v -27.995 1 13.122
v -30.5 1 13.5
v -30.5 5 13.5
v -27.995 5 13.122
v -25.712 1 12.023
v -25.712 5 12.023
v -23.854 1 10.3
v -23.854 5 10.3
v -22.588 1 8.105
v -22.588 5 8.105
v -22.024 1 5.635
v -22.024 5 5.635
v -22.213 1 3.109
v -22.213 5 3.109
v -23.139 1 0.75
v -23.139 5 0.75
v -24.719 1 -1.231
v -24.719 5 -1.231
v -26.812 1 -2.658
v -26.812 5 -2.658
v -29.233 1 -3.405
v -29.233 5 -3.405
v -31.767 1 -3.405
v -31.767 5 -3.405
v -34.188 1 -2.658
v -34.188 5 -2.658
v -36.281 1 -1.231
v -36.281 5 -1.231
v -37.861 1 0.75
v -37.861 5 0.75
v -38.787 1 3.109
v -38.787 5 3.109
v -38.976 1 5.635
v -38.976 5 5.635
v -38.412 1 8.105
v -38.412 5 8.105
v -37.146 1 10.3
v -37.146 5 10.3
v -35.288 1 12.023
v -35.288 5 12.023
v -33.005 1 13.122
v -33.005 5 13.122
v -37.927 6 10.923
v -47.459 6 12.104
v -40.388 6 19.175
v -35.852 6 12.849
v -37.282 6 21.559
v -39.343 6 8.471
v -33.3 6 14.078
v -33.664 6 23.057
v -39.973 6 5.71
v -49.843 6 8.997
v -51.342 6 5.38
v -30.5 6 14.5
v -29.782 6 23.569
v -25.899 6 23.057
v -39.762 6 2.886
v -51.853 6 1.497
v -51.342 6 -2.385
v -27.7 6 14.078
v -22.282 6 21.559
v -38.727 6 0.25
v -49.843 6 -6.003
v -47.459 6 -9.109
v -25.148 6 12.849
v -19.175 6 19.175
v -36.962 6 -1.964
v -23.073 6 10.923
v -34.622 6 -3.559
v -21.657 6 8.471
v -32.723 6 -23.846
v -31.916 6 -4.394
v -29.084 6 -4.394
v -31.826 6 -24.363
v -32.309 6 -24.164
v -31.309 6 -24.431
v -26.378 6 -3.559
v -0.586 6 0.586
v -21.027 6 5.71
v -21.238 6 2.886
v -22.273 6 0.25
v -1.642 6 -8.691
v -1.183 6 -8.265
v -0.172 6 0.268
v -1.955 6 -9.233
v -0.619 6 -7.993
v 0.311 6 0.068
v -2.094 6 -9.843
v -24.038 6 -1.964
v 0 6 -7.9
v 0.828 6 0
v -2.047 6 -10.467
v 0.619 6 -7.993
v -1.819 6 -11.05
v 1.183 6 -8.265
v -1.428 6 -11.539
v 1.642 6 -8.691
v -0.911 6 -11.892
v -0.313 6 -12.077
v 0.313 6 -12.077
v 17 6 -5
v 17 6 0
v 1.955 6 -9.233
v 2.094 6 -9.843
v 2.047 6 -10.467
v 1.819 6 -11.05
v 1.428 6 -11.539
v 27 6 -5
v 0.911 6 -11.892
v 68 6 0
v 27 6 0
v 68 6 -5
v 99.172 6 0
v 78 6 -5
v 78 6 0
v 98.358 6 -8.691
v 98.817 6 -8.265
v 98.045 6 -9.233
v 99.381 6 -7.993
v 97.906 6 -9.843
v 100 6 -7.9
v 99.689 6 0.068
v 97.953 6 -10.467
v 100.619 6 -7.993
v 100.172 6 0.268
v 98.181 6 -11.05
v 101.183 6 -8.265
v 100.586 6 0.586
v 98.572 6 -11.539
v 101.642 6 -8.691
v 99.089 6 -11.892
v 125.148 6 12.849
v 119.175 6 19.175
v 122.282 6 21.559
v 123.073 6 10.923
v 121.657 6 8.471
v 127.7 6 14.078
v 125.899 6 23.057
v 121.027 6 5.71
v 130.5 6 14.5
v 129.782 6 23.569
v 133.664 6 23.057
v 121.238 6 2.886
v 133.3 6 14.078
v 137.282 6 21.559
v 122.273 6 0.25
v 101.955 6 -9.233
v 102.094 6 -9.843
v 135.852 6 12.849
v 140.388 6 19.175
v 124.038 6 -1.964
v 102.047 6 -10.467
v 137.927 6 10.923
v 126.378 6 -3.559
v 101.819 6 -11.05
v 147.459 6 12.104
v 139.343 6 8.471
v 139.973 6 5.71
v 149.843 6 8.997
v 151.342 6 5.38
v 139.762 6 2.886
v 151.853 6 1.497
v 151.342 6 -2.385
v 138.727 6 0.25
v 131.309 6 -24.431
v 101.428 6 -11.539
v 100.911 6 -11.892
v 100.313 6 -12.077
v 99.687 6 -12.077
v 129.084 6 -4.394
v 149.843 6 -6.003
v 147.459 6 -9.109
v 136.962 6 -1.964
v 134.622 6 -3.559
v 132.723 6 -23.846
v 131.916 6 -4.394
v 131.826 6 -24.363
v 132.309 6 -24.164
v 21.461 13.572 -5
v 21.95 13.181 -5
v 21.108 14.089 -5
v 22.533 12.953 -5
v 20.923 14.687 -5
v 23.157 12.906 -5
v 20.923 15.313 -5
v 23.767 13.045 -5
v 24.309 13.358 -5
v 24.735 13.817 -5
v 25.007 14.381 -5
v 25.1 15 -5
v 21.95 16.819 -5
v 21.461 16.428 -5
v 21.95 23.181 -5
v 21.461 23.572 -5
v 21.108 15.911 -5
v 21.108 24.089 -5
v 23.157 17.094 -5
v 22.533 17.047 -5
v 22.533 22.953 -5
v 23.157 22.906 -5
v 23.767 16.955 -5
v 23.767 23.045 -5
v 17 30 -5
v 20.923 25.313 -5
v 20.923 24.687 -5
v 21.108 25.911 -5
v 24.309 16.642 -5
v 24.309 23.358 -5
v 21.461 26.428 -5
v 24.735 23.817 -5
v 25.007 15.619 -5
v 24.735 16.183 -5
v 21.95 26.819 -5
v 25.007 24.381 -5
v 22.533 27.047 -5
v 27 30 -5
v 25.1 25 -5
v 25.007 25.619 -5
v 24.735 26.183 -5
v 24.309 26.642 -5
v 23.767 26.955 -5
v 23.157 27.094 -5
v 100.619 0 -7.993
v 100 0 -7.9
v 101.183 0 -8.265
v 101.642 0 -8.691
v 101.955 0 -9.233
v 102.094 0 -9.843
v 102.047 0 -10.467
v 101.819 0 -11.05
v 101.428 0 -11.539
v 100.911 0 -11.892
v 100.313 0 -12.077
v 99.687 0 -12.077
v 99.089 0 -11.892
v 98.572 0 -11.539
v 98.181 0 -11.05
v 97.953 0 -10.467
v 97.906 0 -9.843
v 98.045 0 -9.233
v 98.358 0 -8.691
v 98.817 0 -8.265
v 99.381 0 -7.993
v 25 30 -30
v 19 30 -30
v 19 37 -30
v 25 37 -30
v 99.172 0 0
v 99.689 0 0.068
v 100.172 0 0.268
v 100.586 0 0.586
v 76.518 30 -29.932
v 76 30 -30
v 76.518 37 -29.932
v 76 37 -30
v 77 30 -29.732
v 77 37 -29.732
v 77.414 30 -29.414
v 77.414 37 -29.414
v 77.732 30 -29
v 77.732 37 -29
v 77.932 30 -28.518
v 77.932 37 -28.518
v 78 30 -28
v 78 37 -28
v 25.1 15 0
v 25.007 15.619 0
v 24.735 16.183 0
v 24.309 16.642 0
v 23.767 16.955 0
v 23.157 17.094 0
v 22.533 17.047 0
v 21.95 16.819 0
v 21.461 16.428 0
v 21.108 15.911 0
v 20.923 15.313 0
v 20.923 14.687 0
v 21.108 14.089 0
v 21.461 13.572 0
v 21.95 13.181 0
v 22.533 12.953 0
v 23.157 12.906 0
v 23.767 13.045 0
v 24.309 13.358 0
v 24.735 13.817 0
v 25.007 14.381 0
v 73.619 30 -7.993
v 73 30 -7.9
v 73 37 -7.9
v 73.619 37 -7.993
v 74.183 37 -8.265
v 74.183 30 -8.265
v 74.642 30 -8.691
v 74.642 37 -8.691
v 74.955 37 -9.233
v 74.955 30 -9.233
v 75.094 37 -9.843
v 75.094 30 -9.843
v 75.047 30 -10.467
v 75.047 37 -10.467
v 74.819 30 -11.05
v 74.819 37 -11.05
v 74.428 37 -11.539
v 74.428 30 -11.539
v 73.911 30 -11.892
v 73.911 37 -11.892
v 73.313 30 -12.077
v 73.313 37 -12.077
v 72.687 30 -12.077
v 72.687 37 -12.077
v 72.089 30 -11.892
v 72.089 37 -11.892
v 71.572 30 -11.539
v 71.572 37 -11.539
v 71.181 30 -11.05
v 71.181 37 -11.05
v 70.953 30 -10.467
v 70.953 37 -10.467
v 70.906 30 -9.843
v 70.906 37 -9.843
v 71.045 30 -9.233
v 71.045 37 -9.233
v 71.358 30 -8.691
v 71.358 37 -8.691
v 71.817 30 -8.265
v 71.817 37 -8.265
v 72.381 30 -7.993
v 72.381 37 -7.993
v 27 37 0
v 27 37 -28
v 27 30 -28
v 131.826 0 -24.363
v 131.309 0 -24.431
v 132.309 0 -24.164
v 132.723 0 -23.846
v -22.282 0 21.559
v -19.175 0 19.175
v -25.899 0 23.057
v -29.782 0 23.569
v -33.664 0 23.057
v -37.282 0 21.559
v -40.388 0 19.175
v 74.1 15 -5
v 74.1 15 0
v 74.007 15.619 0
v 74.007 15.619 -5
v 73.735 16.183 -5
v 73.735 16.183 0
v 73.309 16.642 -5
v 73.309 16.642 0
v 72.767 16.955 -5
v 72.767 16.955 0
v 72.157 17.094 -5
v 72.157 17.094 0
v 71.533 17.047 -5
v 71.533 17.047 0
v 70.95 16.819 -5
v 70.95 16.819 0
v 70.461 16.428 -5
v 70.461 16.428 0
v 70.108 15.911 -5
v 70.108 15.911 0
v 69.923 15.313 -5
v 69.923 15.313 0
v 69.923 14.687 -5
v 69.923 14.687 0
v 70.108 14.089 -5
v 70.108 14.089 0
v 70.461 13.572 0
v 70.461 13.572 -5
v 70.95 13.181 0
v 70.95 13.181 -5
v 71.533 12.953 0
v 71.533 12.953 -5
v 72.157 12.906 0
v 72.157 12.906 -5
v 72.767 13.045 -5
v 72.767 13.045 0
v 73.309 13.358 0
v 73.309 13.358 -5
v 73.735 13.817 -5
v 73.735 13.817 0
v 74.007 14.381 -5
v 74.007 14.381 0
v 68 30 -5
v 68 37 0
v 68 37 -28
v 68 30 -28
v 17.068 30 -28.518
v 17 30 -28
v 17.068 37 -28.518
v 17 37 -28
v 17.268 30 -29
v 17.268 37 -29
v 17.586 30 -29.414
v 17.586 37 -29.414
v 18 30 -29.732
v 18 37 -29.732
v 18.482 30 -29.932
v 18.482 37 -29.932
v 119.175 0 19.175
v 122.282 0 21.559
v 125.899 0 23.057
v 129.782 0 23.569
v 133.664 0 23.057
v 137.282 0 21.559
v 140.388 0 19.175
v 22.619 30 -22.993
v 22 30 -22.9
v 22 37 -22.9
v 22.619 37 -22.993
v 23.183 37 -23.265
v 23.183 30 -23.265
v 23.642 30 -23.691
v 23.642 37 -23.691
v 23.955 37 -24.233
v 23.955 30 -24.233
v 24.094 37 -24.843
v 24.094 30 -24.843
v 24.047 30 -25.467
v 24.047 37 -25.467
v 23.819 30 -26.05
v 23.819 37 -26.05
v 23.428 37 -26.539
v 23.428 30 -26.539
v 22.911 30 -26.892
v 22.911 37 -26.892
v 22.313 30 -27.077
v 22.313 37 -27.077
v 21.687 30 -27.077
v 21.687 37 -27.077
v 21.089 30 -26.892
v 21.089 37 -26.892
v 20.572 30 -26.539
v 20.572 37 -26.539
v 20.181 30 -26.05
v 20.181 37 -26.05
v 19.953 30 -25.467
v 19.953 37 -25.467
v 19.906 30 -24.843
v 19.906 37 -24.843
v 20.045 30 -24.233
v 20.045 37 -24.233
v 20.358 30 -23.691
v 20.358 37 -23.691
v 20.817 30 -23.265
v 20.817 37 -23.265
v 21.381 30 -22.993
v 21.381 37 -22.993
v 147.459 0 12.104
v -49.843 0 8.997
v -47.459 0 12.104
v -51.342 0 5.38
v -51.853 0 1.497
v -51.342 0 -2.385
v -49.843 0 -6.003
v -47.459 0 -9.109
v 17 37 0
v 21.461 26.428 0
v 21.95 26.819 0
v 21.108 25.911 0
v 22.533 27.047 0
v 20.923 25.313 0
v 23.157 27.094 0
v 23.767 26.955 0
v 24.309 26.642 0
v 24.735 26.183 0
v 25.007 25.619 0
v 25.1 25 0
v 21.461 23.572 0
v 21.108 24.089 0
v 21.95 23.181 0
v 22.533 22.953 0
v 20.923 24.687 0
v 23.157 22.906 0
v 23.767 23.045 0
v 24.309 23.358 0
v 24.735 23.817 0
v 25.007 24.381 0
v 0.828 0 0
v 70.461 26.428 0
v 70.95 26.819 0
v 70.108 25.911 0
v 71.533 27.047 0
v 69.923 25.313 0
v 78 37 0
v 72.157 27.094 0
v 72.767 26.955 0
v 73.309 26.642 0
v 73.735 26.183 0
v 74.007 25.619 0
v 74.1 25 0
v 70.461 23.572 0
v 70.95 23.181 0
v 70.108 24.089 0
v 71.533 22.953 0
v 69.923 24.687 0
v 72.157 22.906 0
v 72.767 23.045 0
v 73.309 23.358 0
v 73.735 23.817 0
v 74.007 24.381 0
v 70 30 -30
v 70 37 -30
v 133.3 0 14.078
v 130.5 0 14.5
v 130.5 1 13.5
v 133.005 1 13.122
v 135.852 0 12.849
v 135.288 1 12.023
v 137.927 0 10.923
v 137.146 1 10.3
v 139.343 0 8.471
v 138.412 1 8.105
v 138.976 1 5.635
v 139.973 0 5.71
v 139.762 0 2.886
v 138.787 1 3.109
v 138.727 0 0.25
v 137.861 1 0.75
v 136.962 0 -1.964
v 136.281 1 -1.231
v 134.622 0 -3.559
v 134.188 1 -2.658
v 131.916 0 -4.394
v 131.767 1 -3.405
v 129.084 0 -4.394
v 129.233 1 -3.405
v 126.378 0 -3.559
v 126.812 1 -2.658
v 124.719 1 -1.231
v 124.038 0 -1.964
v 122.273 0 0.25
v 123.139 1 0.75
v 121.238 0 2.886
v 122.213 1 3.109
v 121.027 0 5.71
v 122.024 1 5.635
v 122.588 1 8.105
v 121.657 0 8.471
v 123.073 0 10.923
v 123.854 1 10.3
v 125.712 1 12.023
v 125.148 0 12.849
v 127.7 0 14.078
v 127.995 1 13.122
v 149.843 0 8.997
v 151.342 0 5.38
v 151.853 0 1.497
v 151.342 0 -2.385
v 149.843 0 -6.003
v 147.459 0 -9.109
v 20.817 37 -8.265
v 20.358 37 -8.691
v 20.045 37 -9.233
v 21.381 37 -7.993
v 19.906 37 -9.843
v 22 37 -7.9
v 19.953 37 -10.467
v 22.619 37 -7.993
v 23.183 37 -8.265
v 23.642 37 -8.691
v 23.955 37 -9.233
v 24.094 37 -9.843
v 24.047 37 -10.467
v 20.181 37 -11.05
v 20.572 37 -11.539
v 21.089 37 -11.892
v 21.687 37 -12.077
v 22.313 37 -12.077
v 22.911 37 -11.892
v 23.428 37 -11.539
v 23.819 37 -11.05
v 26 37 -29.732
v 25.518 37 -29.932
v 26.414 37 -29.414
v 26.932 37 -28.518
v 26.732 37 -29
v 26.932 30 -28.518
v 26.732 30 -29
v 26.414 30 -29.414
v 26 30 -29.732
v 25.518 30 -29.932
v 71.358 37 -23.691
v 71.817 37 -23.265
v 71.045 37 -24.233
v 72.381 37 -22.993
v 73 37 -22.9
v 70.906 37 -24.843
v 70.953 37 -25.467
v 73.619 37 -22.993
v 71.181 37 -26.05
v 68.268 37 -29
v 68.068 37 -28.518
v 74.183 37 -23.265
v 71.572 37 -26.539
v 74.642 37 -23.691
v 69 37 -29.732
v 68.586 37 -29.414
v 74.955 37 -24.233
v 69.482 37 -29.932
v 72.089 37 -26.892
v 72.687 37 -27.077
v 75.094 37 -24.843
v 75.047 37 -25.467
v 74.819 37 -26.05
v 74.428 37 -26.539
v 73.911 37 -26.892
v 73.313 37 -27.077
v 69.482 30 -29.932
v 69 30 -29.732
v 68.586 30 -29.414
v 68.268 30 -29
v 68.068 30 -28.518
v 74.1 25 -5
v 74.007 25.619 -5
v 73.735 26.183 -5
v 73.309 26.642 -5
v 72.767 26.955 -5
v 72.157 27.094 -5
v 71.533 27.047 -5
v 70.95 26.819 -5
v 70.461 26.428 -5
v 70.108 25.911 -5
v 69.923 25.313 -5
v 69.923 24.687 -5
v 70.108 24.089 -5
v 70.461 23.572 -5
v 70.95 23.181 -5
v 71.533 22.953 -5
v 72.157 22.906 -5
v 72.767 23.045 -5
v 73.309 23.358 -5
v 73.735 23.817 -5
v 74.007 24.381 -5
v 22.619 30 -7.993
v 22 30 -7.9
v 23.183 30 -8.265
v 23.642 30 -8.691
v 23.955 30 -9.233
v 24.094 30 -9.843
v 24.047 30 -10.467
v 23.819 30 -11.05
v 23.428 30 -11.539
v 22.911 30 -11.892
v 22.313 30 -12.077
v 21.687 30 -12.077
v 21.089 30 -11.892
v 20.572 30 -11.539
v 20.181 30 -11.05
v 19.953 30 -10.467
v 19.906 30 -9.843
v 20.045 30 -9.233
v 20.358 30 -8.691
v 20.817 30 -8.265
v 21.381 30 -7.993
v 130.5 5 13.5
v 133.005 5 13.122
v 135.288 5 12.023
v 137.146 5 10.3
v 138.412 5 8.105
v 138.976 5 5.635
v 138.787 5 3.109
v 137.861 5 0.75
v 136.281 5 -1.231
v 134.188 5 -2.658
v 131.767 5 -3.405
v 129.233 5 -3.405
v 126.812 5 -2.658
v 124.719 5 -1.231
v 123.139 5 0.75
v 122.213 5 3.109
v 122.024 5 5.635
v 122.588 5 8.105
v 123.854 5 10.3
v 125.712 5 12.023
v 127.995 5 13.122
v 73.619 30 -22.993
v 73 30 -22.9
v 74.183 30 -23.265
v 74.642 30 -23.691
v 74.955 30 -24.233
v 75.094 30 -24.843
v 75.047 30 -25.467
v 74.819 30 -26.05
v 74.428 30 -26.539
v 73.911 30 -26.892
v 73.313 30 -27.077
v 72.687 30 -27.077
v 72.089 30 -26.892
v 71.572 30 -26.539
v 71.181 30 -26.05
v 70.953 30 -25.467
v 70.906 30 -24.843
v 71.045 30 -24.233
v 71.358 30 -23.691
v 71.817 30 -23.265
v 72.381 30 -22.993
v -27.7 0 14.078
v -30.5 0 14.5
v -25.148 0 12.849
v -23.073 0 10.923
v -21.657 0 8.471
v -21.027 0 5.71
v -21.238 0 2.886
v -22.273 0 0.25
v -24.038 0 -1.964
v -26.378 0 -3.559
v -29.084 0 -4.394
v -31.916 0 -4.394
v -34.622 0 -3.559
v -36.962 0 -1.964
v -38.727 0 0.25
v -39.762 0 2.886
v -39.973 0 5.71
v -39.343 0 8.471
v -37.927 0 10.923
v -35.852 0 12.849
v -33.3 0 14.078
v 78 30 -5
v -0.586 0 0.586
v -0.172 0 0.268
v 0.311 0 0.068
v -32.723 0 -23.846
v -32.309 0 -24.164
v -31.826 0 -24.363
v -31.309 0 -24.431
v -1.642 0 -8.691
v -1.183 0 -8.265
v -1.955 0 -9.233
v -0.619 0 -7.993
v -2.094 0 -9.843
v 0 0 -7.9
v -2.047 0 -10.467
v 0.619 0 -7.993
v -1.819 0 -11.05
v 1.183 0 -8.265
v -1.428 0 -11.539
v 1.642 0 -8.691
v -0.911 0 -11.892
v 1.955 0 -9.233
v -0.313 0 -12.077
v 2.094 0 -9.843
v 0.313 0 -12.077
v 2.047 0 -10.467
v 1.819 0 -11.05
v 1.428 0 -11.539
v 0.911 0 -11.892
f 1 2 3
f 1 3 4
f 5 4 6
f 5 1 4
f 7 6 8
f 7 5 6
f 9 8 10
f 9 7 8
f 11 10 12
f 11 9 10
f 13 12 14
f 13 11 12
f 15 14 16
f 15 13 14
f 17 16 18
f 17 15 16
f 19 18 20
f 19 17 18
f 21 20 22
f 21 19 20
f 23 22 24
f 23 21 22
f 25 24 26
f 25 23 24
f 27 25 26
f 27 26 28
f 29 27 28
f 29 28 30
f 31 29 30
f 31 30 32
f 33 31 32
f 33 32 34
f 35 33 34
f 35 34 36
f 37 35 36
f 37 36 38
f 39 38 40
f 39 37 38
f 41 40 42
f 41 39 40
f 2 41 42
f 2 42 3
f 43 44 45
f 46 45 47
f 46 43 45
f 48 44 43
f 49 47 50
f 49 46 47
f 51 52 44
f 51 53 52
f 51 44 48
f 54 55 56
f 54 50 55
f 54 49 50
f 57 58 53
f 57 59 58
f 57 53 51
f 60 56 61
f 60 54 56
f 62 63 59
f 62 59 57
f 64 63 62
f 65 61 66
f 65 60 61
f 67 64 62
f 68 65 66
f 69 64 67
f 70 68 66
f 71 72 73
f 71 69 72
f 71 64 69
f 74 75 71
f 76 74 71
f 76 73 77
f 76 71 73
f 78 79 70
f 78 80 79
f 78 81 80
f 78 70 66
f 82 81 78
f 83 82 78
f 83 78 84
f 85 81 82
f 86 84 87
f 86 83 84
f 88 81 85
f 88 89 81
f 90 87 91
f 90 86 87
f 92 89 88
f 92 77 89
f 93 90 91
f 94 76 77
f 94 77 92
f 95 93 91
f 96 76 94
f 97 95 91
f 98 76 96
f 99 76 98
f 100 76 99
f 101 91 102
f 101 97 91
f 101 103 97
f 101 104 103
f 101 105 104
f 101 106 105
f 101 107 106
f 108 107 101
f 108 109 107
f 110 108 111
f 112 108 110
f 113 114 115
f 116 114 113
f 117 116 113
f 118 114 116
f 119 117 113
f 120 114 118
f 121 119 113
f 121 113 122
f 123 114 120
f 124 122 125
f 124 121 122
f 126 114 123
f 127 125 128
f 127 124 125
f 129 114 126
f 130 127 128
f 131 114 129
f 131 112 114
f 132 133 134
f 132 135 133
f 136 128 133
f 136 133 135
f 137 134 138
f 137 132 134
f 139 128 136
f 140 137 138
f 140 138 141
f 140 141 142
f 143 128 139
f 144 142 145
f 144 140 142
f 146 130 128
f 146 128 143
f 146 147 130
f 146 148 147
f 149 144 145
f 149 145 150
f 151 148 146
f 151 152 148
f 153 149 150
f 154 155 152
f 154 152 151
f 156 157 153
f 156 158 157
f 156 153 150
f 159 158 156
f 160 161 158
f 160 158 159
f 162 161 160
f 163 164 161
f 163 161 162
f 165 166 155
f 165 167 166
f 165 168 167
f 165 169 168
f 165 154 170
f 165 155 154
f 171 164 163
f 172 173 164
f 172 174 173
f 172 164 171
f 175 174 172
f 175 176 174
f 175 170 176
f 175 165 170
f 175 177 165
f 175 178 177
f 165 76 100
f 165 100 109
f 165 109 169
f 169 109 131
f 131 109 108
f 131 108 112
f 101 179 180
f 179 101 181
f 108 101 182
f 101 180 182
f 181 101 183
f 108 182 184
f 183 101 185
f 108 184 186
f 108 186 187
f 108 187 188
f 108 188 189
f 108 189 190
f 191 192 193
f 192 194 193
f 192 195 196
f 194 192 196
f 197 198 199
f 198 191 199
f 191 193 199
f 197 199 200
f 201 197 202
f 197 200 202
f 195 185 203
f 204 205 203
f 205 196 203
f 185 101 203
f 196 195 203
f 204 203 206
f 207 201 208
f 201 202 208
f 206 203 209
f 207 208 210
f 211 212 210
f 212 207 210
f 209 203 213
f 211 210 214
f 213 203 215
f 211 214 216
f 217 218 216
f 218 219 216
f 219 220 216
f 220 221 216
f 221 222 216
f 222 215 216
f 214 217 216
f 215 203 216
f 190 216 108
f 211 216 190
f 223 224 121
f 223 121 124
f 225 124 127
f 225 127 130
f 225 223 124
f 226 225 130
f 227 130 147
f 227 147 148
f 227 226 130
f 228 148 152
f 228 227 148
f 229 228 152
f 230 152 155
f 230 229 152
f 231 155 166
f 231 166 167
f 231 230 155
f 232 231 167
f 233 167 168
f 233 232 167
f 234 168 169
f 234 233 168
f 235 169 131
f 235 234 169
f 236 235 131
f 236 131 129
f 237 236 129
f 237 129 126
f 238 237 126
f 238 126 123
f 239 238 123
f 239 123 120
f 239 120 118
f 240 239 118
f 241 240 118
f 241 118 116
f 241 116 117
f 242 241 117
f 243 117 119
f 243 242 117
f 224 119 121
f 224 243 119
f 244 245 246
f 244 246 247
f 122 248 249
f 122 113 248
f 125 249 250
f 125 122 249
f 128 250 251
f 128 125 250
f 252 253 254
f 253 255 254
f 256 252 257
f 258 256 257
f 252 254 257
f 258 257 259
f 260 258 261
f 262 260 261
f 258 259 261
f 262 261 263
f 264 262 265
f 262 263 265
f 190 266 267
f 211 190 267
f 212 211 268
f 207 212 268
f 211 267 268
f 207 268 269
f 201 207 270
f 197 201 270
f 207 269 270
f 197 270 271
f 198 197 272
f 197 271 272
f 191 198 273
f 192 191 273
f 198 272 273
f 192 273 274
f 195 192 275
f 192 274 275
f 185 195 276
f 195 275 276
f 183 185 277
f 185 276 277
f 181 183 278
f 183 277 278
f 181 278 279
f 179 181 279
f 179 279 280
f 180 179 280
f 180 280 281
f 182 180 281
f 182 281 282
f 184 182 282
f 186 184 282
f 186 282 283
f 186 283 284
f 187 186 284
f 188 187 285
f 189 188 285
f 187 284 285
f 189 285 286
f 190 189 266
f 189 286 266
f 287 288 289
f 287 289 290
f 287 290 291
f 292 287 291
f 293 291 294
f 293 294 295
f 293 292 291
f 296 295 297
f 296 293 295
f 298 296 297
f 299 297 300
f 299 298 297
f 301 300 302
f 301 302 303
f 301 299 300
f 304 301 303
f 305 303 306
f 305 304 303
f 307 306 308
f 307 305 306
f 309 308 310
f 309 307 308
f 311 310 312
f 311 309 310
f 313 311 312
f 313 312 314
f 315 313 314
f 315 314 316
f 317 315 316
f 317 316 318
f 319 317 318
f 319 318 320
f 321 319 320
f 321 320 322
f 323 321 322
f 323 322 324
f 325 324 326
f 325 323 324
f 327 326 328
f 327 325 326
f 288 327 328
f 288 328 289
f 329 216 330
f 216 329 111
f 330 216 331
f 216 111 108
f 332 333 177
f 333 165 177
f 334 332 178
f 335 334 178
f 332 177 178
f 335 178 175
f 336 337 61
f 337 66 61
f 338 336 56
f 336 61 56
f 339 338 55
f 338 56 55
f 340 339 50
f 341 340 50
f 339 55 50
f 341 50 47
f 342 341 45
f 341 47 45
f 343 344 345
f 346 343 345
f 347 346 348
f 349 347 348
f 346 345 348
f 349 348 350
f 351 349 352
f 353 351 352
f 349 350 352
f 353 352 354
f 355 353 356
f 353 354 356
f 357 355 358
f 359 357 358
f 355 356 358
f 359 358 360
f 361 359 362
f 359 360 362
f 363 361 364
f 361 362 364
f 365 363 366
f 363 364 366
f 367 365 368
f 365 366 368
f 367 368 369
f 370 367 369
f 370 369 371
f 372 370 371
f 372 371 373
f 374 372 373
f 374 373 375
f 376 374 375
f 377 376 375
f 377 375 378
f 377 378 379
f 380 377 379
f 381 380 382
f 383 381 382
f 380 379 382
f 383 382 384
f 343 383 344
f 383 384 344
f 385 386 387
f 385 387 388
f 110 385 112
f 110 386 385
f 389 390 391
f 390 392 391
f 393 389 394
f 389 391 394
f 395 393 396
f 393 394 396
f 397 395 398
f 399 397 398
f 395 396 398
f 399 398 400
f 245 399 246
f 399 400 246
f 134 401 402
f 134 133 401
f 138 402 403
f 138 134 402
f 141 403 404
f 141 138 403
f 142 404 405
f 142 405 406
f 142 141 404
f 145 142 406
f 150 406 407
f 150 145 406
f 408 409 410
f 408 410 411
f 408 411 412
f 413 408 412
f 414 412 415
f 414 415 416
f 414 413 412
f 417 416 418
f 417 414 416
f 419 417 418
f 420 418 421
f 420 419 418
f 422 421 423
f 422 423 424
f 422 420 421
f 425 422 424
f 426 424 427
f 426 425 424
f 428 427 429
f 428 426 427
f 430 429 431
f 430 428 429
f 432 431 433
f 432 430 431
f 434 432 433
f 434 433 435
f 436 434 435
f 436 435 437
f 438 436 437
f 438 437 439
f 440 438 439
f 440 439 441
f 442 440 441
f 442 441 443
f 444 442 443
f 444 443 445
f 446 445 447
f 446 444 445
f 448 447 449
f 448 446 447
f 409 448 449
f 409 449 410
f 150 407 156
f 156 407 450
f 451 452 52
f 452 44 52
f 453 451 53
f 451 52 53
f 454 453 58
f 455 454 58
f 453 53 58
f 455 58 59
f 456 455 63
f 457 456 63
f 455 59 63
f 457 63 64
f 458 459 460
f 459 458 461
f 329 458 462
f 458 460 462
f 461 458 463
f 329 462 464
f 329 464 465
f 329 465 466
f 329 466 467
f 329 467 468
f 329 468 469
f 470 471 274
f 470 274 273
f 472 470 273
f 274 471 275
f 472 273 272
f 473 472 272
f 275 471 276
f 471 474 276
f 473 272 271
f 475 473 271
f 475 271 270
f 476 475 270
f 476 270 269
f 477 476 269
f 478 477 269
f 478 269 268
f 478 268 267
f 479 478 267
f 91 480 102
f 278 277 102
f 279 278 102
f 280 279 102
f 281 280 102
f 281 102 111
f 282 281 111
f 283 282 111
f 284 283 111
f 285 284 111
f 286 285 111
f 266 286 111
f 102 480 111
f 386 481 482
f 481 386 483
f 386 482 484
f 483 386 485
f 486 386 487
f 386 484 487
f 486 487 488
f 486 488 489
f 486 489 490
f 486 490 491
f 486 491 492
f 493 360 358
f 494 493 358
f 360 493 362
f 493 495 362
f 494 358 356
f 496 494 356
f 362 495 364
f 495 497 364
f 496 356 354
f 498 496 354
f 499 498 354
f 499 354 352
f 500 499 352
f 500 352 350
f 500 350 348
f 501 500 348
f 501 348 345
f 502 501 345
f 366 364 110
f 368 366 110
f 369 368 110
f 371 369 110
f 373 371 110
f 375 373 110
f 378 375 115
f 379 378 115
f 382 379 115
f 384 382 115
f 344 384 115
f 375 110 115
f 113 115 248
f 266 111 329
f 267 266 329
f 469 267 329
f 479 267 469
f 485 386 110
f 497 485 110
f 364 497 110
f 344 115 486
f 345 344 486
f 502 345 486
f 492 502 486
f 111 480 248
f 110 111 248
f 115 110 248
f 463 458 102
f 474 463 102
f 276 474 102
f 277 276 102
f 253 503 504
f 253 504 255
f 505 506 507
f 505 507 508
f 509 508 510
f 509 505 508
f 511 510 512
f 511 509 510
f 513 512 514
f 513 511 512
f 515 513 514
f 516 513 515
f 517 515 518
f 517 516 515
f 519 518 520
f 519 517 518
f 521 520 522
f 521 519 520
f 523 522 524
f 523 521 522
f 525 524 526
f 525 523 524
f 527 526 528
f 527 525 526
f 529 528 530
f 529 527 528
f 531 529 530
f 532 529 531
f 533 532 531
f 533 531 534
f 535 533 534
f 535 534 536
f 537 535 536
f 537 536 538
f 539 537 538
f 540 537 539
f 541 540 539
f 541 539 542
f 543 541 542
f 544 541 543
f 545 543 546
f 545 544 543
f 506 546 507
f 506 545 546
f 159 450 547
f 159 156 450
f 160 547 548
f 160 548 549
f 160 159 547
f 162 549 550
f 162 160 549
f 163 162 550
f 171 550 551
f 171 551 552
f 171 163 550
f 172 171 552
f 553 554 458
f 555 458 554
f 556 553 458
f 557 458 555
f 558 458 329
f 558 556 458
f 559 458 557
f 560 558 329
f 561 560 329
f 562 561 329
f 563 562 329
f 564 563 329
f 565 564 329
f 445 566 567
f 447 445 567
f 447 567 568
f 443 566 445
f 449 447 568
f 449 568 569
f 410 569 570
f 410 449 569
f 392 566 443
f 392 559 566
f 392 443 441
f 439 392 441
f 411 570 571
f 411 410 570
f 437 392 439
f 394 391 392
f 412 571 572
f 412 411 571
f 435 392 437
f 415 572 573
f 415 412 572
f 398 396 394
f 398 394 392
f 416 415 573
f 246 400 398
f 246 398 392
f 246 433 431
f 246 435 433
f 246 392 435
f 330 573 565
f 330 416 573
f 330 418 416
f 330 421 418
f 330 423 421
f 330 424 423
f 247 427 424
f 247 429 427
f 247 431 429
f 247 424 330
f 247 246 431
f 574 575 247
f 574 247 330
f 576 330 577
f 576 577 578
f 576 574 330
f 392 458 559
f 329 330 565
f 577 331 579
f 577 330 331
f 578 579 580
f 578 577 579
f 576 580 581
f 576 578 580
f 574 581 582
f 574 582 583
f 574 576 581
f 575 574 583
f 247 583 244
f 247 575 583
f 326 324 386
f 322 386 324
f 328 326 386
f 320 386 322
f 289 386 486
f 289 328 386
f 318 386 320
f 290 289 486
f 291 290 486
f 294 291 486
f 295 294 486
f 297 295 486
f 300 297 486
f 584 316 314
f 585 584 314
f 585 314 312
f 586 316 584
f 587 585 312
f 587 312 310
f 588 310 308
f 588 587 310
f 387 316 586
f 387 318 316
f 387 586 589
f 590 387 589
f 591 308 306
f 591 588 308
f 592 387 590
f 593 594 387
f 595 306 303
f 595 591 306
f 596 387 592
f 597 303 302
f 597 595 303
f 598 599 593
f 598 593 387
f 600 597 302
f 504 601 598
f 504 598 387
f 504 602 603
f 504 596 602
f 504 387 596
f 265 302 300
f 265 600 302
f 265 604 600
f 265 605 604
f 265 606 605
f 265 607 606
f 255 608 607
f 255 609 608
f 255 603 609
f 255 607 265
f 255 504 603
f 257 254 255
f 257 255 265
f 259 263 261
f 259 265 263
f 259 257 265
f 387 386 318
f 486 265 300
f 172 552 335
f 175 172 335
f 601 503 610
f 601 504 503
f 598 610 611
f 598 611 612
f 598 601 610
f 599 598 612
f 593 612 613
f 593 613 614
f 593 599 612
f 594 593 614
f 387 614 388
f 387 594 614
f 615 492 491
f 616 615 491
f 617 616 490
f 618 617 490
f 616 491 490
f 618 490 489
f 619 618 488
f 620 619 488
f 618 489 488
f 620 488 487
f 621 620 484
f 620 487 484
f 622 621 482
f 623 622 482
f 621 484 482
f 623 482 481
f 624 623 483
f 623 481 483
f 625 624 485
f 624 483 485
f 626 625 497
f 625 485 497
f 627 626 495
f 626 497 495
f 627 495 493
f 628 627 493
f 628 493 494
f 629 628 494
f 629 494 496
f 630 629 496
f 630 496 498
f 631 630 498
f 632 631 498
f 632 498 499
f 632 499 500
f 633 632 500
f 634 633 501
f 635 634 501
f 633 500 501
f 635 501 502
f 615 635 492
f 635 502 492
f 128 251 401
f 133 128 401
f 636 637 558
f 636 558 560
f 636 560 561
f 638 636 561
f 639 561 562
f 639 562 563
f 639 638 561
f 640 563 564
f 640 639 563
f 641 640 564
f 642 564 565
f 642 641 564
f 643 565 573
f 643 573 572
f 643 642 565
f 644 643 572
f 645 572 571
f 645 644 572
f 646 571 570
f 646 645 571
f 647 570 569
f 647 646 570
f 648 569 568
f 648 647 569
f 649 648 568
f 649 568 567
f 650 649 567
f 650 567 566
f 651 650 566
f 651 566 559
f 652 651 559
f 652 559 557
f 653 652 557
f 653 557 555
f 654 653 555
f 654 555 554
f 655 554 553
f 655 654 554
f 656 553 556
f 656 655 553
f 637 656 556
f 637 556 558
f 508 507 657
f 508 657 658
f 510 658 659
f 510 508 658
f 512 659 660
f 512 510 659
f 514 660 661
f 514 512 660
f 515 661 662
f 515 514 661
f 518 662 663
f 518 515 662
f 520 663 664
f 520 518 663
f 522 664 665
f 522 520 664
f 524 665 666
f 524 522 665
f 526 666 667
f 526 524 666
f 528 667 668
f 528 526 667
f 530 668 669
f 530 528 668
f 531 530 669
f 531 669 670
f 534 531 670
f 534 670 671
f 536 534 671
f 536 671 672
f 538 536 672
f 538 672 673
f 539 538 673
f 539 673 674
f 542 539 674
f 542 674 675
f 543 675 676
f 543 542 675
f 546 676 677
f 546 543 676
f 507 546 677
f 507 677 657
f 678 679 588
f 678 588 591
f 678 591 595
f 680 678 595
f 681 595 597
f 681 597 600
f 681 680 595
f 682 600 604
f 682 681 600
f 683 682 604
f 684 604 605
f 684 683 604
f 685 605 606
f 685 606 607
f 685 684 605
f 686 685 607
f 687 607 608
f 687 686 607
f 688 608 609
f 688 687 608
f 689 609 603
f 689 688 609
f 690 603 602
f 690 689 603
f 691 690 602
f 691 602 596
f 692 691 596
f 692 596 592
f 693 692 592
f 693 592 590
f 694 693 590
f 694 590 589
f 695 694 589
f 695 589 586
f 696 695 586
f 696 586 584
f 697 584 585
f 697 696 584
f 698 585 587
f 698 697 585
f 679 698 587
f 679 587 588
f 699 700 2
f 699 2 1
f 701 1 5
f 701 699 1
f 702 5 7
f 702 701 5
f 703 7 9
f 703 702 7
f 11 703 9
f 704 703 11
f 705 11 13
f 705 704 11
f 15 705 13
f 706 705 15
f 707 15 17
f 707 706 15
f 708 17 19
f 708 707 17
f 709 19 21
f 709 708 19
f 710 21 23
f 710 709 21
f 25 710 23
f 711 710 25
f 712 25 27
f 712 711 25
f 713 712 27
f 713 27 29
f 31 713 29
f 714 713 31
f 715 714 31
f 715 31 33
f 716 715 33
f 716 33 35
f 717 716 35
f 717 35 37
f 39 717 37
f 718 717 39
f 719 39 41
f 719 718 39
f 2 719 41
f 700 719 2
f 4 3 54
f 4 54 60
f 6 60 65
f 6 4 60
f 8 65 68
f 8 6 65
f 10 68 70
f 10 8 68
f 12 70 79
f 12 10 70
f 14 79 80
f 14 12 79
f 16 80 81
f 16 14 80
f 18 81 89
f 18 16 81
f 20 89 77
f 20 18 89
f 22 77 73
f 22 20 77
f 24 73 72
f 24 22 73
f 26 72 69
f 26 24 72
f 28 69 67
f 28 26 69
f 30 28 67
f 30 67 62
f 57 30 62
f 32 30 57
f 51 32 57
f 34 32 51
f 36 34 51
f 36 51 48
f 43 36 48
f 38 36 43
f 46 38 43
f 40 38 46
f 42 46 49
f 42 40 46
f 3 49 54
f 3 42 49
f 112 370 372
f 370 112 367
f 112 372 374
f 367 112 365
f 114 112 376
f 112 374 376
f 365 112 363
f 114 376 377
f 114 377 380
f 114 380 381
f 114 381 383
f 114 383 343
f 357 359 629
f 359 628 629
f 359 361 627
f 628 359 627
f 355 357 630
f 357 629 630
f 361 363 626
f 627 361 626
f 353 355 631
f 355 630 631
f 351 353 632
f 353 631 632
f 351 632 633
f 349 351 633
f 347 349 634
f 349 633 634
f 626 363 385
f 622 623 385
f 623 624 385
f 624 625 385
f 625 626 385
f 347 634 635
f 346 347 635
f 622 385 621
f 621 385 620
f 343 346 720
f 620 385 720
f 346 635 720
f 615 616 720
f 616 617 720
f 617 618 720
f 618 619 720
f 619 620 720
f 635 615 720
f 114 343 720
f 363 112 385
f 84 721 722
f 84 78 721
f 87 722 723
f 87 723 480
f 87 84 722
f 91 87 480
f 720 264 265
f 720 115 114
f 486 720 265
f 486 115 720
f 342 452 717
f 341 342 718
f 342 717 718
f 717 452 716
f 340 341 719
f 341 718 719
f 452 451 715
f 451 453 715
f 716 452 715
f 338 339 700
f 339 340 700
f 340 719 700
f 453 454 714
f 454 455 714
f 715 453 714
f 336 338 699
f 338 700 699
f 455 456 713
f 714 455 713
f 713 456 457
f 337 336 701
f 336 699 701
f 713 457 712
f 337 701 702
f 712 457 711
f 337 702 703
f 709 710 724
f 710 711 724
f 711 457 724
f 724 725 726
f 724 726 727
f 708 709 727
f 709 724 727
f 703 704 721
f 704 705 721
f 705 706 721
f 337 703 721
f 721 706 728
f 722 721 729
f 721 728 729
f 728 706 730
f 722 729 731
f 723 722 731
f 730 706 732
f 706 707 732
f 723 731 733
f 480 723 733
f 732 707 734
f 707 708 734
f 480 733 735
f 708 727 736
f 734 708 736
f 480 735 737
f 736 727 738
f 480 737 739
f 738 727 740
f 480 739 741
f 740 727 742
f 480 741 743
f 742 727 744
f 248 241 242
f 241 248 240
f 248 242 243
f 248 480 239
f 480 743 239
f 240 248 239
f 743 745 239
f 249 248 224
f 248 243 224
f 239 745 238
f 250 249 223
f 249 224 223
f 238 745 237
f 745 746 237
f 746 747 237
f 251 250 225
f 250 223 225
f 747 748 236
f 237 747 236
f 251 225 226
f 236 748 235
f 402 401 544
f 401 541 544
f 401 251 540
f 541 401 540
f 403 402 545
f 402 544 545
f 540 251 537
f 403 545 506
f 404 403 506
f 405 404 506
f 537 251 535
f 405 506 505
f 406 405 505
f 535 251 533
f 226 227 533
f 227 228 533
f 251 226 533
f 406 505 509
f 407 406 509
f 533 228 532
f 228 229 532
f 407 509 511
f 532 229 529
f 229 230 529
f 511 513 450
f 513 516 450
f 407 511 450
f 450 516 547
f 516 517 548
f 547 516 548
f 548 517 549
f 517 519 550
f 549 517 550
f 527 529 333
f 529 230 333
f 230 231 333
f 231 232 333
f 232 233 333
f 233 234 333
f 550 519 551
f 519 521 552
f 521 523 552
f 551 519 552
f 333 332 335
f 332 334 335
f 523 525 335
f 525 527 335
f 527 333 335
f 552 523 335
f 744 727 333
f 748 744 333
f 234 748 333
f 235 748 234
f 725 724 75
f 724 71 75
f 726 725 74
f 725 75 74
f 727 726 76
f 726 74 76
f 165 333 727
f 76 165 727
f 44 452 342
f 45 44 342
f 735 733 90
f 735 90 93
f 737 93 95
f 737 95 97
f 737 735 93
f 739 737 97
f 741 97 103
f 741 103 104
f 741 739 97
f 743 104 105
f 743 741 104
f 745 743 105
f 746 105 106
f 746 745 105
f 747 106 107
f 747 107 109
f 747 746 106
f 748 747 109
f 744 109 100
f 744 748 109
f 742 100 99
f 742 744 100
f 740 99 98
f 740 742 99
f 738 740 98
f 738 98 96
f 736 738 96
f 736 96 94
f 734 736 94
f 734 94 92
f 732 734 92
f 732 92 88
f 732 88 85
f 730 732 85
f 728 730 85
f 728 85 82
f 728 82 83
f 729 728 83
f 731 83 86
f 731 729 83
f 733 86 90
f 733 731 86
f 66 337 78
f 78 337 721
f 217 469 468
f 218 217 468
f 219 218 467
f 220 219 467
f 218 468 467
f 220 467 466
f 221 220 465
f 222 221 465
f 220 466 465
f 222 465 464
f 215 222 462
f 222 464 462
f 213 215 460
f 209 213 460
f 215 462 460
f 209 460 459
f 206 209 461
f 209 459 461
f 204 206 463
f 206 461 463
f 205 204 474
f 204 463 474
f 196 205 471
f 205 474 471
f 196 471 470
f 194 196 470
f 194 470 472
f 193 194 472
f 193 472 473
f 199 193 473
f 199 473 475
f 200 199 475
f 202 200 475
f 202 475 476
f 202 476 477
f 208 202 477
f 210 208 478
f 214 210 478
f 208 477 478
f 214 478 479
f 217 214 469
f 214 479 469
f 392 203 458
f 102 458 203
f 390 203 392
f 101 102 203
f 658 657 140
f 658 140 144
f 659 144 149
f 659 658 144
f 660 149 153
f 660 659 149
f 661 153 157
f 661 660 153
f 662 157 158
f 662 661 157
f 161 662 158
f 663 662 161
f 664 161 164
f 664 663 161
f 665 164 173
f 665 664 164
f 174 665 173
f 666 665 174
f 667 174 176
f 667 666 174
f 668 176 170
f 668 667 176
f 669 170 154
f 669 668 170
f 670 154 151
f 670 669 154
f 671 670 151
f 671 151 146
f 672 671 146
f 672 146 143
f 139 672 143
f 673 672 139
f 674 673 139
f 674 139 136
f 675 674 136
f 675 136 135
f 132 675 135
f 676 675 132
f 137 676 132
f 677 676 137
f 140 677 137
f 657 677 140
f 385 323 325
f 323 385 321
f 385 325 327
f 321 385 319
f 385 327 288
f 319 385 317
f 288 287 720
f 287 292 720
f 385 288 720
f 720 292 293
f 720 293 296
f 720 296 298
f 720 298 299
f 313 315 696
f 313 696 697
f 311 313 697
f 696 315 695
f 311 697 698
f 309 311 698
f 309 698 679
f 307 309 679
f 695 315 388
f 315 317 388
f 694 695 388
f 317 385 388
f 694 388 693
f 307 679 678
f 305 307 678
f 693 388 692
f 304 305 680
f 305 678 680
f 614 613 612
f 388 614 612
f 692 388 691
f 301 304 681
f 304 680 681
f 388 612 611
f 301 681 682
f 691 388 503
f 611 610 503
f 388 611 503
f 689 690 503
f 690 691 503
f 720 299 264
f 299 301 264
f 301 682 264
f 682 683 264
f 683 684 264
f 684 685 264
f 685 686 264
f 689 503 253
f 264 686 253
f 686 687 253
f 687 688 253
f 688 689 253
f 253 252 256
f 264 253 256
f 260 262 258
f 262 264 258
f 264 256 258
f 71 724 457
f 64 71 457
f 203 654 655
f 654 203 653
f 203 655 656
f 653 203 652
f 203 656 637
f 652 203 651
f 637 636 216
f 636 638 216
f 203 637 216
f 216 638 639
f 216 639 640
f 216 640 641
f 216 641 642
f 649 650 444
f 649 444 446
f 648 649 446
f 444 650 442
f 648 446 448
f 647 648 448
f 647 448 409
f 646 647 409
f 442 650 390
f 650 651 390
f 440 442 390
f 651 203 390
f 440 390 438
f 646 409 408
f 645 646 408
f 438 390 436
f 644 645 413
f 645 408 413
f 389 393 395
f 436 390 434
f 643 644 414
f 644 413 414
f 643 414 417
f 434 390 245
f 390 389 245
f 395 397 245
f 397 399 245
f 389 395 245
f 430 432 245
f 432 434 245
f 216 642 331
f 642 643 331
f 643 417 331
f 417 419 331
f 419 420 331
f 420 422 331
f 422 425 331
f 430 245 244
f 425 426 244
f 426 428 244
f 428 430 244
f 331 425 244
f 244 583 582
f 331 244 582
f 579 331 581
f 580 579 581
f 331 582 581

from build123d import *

# Parameters (mm, degrees)
SKETCH_1_R      = 8.5
SKETCH_1_R_2    = 2.1
EXTRUDE_1_DEPTH = 6
FILLET_1_R      = 15
FILLET_2_R      = 2
SKETCH_2_R      = 2.1
EXTRUDE_2_DEPTH = 5
SKETCH_3_W      = 10
SKETCH_3_H      = 30
SKETCH_3_R      = 2.1
EXTRUDE_3_DEPTH = 7
FILLET_4_R      = 2
FILLET_5_R      = 2
CHAMFER_1_SIZE  = 1


with BuildPart() as part:
    # 草图1 → 凸台-拉伸1 (new body)
    with BuildSketch(Plane(origin=(0, 0, 0), x_dir=(1, 0, 0), z_dir=(0, 1, 0))):
        Polygon((0, 0), (100, 0), (129.781745931, -29.781745931), (158.066017178, -1.497474683), (132.13708499, 24.431457505), (70, 24.431457505), (30, 24.431457505), (-32.13708499, 24.431457505), (-58.066017178, -1.497474683), (-29.781745931, -29.781745931), align=None)
        with Locations(Location((-30.5, -5, 0), (0, 0, 270))):
            Circle(SKETCH_1_R, mode=Mode.SUBTRACT)
        with Locations(Location((130.5, -5, 0), (0, 0, 270))):
            Circle(SKETCH_1_R, mode=Mode.SUBTRACT)
        with Locations(Location((0, 10, 0), (0, 0, 270))):
            Circle(SKETCH_1_R_2, mode=Mode.SUBTRACT)
        with Locations(Location((100, 10, 0), (0, 0, 270))):
            Circle(SKETCH_1_R_2, mode=Mode.SUBTRACT)
    extrude(amount=EXTRUDE_1_DEPTH)

    # 圆角1
    fillet_1_edges = [part.edges().sort_by_distance(p)[0] for p in [
        (-29.781745931, 3, 29.781745931),
        (-58.066017178, 3, 1.497474683),
        (158.066017178, 3, 1.497474683),
        (129.781745931, 3, 29.781745931),
    ]]
    fillet(fillet_1_edges, radius=FILLET_1_R)

    # 圆角2
    fillet_2_edges = [part.edges().sort_by_distance(p)[0] for p in [
        (100, 3, 0),
        (0, 3, 0),
    ]]
    fillet(fillet_2_edges, radius=FILLET_2_R)

    # 草图2 → 凸台-拉伸2 (add)
    # profile 1 of 4: a face of its own
    with BuildSketch(Plane.XY):
        Polygon((17, 6), (23, 6), (27, 6), (27, 30), (17, 30), align=None)
        with Locations((23, 15)):
            Circle(SKETCH_2_R, mode=Mode.SUBTRACT)
        with Locations((23, 25)):
            Circle(SKETCH_2_R, mode=Mode.SUBTRACT)
    # profile 2 of 4: a face of its own
    with BuildSketch(Plane.XY):
        Polygon((27, 6), (23, 6), (17, 6), (17, 0), (27, 0), align=None)
    # profile 3 of 4: a face of its own
    with BuildSketch(Plane.XY):
        Polygon((68, 30), (68, 6), (72, 6), (78, 6), (78, 30), align=None)
        with Locations((72, 15)):
            Circle(SKETCH_2_R, mode=Mode.SUBTRACT)
        with Locations((72, 25)):
            Circle(SKETCH_2_R, mode=Mode.SUBTRACT)
    # profile 4 of 4: a face of its own
    with BuildSketch(Plane.XY):
        Polygon((72, 6), (68, 6), (68, 0), (78, 0), (78, 6), align=None)
    extrude(amount=-EXTRUDE_2_DEPTH)

    # 草图3 → 凸台-拉伸3 (add)
    # profile 1 of 2: a face of its own
    with BuildSketch(Plane(origin=(0, 30, 0), x_dir=(1, 0, 0), z_dir=(0, 1, 0))):
        with Locations((22, 15)):
            Rectangle(SKETCH_3_W, SKETCH_3_H)
        with Locations(Location((22, 25, 0), (0, 0, 270))):
            Circle(SKETCH_3_R, mode=Mode.SUBTRACT)
        with Locations(Location((22, 10, 0), (0, 0, 270))):
            Circle(SKETCH_3_R, mode=Mode.SUBTRACT)
    # profile 2 of 2: a face of its own
    with BuildSketch(Plane(origin=(0, 30, 0), x_dir=(1, 0, 0), z_dir=(0, 1, 0))):
        with Locations((73, 15)):
            Rectangle(SKETCH_3_W, SKETCH_3_H)
        with Locations(Location((73, 25, 0), (0, 0, 270))):
            Circle(SKETCH_3_R, mode=Mode.SUBTRACT)
        with Locations(Location((73, 10, 0), (0, 0, 270))):
            Circle(SKETCH_3_R, mode=Mode.SUBTRACT)
    extrude(amount=EXTRUDE_3_DEPTH)

    # 圆角4
    fillet_4_edges = [part.edges().sort_by_distance(p)[0] for p in [
        (27, 33.5, -30),
        (17, 33.5, -30),
        (78, 33.5, -30),
        (68, 33.5, -30),
    ]]
    fillet(fillet_4_edges, radius=FILLET_4_R)

    # 圆角5
    fillet_5_edges = [part.edges().sort_by_distance(p)[0] for p in [
        (-32.13708499, 3, -24.431457505),
        (132.13708499, 3, -24.431457505),
    ]]
    fillet(fillet_5_edges, radius=FILLET_5_R)

    # 倒角1
    chamfer_1_edges = [part.edges().sort_by_distance(p)[0] for p in [
        (-30.5, 0, -3.5),
        (-30.5, 6, -3.5),
        (130.5, 0, -3.5),
        (130.5, 6, -3.5),
    ]]
    chamfer(chamfer_1_edges, length=CHAMFER_1_SIZE)


solid = part.part
